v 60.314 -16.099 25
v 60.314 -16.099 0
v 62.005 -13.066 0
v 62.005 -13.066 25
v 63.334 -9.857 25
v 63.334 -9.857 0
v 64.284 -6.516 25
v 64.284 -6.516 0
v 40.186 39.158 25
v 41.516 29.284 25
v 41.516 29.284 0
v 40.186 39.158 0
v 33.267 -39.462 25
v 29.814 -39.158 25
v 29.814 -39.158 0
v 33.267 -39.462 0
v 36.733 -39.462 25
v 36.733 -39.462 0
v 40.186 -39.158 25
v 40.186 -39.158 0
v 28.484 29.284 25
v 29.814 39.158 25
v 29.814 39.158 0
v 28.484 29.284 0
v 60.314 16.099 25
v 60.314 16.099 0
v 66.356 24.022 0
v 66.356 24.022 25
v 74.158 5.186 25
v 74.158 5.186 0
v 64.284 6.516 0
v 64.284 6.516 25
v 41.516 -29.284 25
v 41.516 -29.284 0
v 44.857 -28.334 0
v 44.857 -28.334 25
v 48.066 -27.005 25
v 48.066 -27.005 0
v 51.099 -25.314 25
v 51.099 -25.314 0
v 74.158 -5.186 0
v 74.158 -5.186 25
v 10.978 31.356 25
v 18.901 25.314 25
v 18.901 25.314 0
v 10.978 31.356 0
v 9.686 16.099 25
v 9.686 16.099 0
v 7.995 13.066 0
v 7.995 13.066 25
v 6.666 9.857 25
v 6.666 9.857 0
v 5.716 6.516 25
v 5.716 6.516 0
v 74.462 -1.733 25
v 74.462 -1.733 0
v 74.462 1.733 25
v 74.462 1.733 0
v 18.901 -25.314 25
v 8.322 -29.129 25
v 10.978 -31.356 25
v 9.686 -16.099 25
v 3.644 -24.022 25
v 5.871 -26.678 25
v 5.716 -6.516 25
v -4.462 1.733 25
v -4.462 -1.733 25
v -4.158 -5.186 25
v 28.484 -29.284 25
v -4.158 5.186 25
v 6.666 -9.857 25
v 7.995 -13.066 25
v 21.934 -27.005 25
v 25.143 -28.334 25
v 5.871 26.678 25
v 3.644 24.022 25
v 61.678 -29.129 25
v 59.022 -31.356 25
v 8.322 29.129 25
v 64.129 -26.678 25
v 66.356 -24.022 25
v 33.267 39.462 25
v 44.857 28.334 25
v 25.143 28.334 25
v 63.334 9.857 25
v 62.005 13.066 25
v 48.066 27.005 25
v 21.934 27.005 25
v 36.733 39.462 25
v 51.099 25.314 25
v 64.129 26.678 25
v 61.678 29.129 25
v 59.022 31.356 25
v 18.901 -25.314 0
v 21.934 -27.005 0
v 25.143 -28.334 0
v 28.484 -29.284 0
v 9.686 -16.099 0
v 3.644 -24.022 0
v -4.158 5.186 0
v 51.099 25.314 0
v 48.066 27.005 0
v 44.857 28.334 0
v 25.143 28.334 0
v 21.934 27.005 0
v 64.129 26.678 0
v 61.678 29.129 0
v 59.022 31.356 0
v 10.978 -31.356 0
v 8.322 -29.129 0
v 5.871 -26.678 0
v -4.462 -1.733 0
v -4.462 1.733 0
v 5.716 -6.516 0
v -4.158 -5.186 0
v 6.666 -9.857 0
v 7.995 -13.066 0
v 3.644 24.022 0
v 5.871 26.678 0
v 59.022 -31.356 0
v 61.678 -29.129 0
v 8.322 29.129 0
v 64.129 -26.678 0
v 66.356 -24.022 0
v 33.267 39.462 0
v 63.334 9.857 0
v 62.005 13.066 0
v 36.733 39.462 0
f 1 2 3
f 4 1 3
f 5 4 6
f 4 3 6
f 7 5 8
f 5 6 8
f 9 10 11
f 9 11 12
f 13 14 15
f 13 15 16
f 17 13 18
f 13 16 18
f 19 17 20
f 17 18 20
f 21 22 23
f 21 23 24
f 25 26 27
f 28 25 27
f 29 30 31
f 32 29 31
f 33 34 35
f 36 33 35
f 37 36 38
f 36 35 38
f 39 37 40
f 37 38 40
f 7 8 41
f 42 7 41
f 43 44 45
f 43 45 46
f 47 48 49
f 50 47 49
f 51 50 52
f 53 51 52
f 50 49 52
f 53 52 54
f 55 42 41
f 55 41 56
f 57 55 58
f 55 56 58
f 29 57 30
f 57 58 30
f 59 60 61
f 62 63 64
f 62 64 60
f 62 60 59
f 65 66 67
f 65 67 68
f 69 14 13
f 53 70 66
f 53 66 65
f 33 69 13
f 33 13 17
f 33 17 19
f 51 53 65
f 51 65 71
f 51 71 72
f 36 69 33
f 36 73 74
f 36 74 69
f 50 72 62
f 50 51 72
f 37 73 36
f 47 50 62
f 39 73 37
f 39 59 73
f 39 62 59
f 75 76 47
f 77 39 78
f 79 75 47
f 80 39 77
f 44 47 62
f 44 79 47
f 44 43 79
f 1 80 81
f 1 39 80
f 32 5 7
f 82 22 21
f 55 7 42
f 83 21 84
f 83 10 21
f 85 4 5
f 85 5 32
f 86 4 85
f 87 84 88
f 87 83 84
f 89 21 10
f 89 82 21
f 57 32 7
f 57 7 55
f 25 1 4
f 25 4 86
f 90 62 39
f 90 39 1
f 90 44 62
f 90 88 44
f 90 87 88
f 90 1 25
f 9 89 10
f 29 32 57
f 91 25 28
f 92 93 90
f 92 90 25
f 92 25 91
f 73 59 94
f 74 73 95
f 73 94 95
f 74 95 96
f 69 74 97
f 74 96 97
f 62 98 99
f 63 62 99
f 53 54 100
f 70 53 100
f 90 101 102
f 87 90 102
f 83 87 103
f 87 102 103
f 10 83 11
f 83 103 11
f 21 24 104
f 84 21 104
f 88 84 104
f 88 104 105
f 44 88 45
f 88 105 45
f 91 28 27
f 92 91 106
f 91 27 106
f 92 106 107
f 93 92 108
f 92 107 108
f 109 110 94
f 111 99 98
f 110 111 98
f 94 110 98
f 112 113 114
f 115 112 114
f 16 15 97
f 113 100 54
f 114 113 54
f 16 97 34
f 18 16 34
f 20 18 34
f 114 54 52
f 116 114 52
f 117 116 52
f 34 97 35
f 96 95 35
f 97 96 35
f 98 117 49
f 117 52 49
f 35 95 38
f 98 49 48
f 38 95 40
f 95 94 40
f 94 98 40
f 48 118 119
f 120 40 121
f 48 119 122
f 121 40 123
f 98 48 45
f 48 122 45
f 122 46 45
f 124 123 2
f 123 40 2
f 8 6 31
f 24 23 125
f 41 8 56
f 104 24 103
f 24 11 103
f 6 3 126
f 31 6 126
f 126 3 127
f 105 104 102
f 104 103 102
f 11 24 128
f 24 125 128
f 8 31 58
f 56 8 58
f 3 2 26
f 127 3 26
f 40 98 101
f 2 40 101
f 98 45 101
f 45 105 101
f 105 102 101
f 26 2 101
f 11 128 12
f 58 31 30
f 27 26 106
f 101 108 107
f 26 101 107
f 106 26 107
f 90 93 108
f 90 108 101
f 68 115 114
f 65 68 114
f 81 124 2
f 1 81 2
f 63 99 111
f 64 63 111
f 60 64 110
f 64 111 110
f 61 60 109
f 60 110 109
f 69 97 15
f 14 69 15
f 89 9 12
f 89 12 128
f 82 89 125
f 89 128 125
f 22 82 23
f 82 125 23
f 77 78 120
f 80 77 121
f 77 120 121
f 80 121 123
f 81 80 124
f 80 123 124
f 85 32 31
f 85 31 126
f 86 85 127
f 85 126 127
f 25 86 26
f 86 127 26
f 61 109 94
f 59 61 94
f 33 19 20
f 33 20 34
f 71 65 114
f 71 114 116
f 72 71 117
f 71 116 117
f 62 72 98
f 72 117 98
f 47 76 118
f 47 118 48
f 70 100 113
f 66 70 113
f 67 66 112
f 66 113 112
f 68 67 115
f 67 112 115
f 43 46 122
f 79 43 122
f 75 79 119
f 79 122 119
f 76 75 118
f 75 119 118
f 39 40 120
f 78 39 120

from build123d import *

# Parameters (mm, degrees)
F1_DEPTH = 25


with BuildPart() as f1:
    # F0 (on Top) → F1 (new body)
    with BuildSketch(Plane.XY):
        with BuildLine():
            ThreePointArc((29.813631, -39.158033), (35, -39.5), (40.186369, -39.158033))
            Line((40.186369, -39.158033), (41.516062, -29.2838))
            ThreePointArc((41.516062, -29.2838), (46.480503, -27.716386), (51.099222, -25.314325))
            Line((51.099222, -25.314325), (59.021594, -31.356228))
            ThreePointArc((59.021594, -31.356228), (62.930718, -27.930718), (66.356228, -24.021594))
            Line((66.356228, -24.021594), (60.314325, -16.099222))
            ThreePointArc((60.314325, -16.099222), (62.716386, -11.480503), (64.2838, -6.516062))
            Line((64.2838, -6.516062), (74.158033, -5.186369))
            ThreePointArc((74.158033, -5.186369), (74.5, 0), (74.158033, 5.186369))
            Line((74.158033, 5.186369), (64.2838, 6.516062))
            ThreePointArc((64.2838, 6.516062), (62.716386, 11.480503), (60.314325, 16.099222))
            Line((60.314325, 16.099222), (66.356228, 24.021594))
            ThreePointArc((66.356228, 24.021594), (62.930718, 27.930718), (59.021594, 31.356228))
            Line((59.021594, 31.356228), (51.099222, 25.314325))
            ThreePointArc((51.099222, 25.314325), (46.480503, 27.716386), (41.516062, 29.2838))
            Line((41.516062, 29.2838), (40.186369, 39.158033))
            ThreePointArc((40.186369, 39.158033), (35, 39.5), (29.813631, 39.158033))
            Line((29.813631, 39.158033), (28.483938, 29.2838))
            ThreePointArc((28.483938, 29.2838), (23.519497, 27.716386), (18.900778, 25.314325))
            Line((18.900778, 25.314325), (10.978406, 31.356228))
            ThreePointArc((10.978406, 31.356228), (7.069282, 27.930718), (3.643772, 24.021594))
            Line((3.643772, 24.021594), (9.685675, 16.099222))
            ThreePointArc((9.685675, 16.099222), (7.283614, 11.480503), (5.7162, 6.516062))
            Line((5.7162, 6.516062), (-4.158033, 5.186369))
            ThreePointArc((-4.158033, 5.186369), (-4.5, 0), (-4.158033, -5.186369))
            Line((-4.158033, -5.186369), (5.7162, -6.516062))
            ThreePointArc((5.7162, -6.516062), (7.283614, -11.480503), (9.685675, -16.099222))
            Line((9.685675, -16.099222), (3.643772, -24.021594))
            ThreePointArc((3.643772, -24.021594), (7.069282, -27.930718), (10.978406, -31.356228))
            Line((10.978406, -31.356228), (18.900778, -25.314325))
            ThreePointArc((18.900778, -25.314325), (23.519497, -27.716386), (28.483938, -29.2838))
            Line((28.483938, -29.2838), (29.813631, -39.158033))
        make_face()
    extrude(amount=F1_DEPTH)


solid = f1.part
